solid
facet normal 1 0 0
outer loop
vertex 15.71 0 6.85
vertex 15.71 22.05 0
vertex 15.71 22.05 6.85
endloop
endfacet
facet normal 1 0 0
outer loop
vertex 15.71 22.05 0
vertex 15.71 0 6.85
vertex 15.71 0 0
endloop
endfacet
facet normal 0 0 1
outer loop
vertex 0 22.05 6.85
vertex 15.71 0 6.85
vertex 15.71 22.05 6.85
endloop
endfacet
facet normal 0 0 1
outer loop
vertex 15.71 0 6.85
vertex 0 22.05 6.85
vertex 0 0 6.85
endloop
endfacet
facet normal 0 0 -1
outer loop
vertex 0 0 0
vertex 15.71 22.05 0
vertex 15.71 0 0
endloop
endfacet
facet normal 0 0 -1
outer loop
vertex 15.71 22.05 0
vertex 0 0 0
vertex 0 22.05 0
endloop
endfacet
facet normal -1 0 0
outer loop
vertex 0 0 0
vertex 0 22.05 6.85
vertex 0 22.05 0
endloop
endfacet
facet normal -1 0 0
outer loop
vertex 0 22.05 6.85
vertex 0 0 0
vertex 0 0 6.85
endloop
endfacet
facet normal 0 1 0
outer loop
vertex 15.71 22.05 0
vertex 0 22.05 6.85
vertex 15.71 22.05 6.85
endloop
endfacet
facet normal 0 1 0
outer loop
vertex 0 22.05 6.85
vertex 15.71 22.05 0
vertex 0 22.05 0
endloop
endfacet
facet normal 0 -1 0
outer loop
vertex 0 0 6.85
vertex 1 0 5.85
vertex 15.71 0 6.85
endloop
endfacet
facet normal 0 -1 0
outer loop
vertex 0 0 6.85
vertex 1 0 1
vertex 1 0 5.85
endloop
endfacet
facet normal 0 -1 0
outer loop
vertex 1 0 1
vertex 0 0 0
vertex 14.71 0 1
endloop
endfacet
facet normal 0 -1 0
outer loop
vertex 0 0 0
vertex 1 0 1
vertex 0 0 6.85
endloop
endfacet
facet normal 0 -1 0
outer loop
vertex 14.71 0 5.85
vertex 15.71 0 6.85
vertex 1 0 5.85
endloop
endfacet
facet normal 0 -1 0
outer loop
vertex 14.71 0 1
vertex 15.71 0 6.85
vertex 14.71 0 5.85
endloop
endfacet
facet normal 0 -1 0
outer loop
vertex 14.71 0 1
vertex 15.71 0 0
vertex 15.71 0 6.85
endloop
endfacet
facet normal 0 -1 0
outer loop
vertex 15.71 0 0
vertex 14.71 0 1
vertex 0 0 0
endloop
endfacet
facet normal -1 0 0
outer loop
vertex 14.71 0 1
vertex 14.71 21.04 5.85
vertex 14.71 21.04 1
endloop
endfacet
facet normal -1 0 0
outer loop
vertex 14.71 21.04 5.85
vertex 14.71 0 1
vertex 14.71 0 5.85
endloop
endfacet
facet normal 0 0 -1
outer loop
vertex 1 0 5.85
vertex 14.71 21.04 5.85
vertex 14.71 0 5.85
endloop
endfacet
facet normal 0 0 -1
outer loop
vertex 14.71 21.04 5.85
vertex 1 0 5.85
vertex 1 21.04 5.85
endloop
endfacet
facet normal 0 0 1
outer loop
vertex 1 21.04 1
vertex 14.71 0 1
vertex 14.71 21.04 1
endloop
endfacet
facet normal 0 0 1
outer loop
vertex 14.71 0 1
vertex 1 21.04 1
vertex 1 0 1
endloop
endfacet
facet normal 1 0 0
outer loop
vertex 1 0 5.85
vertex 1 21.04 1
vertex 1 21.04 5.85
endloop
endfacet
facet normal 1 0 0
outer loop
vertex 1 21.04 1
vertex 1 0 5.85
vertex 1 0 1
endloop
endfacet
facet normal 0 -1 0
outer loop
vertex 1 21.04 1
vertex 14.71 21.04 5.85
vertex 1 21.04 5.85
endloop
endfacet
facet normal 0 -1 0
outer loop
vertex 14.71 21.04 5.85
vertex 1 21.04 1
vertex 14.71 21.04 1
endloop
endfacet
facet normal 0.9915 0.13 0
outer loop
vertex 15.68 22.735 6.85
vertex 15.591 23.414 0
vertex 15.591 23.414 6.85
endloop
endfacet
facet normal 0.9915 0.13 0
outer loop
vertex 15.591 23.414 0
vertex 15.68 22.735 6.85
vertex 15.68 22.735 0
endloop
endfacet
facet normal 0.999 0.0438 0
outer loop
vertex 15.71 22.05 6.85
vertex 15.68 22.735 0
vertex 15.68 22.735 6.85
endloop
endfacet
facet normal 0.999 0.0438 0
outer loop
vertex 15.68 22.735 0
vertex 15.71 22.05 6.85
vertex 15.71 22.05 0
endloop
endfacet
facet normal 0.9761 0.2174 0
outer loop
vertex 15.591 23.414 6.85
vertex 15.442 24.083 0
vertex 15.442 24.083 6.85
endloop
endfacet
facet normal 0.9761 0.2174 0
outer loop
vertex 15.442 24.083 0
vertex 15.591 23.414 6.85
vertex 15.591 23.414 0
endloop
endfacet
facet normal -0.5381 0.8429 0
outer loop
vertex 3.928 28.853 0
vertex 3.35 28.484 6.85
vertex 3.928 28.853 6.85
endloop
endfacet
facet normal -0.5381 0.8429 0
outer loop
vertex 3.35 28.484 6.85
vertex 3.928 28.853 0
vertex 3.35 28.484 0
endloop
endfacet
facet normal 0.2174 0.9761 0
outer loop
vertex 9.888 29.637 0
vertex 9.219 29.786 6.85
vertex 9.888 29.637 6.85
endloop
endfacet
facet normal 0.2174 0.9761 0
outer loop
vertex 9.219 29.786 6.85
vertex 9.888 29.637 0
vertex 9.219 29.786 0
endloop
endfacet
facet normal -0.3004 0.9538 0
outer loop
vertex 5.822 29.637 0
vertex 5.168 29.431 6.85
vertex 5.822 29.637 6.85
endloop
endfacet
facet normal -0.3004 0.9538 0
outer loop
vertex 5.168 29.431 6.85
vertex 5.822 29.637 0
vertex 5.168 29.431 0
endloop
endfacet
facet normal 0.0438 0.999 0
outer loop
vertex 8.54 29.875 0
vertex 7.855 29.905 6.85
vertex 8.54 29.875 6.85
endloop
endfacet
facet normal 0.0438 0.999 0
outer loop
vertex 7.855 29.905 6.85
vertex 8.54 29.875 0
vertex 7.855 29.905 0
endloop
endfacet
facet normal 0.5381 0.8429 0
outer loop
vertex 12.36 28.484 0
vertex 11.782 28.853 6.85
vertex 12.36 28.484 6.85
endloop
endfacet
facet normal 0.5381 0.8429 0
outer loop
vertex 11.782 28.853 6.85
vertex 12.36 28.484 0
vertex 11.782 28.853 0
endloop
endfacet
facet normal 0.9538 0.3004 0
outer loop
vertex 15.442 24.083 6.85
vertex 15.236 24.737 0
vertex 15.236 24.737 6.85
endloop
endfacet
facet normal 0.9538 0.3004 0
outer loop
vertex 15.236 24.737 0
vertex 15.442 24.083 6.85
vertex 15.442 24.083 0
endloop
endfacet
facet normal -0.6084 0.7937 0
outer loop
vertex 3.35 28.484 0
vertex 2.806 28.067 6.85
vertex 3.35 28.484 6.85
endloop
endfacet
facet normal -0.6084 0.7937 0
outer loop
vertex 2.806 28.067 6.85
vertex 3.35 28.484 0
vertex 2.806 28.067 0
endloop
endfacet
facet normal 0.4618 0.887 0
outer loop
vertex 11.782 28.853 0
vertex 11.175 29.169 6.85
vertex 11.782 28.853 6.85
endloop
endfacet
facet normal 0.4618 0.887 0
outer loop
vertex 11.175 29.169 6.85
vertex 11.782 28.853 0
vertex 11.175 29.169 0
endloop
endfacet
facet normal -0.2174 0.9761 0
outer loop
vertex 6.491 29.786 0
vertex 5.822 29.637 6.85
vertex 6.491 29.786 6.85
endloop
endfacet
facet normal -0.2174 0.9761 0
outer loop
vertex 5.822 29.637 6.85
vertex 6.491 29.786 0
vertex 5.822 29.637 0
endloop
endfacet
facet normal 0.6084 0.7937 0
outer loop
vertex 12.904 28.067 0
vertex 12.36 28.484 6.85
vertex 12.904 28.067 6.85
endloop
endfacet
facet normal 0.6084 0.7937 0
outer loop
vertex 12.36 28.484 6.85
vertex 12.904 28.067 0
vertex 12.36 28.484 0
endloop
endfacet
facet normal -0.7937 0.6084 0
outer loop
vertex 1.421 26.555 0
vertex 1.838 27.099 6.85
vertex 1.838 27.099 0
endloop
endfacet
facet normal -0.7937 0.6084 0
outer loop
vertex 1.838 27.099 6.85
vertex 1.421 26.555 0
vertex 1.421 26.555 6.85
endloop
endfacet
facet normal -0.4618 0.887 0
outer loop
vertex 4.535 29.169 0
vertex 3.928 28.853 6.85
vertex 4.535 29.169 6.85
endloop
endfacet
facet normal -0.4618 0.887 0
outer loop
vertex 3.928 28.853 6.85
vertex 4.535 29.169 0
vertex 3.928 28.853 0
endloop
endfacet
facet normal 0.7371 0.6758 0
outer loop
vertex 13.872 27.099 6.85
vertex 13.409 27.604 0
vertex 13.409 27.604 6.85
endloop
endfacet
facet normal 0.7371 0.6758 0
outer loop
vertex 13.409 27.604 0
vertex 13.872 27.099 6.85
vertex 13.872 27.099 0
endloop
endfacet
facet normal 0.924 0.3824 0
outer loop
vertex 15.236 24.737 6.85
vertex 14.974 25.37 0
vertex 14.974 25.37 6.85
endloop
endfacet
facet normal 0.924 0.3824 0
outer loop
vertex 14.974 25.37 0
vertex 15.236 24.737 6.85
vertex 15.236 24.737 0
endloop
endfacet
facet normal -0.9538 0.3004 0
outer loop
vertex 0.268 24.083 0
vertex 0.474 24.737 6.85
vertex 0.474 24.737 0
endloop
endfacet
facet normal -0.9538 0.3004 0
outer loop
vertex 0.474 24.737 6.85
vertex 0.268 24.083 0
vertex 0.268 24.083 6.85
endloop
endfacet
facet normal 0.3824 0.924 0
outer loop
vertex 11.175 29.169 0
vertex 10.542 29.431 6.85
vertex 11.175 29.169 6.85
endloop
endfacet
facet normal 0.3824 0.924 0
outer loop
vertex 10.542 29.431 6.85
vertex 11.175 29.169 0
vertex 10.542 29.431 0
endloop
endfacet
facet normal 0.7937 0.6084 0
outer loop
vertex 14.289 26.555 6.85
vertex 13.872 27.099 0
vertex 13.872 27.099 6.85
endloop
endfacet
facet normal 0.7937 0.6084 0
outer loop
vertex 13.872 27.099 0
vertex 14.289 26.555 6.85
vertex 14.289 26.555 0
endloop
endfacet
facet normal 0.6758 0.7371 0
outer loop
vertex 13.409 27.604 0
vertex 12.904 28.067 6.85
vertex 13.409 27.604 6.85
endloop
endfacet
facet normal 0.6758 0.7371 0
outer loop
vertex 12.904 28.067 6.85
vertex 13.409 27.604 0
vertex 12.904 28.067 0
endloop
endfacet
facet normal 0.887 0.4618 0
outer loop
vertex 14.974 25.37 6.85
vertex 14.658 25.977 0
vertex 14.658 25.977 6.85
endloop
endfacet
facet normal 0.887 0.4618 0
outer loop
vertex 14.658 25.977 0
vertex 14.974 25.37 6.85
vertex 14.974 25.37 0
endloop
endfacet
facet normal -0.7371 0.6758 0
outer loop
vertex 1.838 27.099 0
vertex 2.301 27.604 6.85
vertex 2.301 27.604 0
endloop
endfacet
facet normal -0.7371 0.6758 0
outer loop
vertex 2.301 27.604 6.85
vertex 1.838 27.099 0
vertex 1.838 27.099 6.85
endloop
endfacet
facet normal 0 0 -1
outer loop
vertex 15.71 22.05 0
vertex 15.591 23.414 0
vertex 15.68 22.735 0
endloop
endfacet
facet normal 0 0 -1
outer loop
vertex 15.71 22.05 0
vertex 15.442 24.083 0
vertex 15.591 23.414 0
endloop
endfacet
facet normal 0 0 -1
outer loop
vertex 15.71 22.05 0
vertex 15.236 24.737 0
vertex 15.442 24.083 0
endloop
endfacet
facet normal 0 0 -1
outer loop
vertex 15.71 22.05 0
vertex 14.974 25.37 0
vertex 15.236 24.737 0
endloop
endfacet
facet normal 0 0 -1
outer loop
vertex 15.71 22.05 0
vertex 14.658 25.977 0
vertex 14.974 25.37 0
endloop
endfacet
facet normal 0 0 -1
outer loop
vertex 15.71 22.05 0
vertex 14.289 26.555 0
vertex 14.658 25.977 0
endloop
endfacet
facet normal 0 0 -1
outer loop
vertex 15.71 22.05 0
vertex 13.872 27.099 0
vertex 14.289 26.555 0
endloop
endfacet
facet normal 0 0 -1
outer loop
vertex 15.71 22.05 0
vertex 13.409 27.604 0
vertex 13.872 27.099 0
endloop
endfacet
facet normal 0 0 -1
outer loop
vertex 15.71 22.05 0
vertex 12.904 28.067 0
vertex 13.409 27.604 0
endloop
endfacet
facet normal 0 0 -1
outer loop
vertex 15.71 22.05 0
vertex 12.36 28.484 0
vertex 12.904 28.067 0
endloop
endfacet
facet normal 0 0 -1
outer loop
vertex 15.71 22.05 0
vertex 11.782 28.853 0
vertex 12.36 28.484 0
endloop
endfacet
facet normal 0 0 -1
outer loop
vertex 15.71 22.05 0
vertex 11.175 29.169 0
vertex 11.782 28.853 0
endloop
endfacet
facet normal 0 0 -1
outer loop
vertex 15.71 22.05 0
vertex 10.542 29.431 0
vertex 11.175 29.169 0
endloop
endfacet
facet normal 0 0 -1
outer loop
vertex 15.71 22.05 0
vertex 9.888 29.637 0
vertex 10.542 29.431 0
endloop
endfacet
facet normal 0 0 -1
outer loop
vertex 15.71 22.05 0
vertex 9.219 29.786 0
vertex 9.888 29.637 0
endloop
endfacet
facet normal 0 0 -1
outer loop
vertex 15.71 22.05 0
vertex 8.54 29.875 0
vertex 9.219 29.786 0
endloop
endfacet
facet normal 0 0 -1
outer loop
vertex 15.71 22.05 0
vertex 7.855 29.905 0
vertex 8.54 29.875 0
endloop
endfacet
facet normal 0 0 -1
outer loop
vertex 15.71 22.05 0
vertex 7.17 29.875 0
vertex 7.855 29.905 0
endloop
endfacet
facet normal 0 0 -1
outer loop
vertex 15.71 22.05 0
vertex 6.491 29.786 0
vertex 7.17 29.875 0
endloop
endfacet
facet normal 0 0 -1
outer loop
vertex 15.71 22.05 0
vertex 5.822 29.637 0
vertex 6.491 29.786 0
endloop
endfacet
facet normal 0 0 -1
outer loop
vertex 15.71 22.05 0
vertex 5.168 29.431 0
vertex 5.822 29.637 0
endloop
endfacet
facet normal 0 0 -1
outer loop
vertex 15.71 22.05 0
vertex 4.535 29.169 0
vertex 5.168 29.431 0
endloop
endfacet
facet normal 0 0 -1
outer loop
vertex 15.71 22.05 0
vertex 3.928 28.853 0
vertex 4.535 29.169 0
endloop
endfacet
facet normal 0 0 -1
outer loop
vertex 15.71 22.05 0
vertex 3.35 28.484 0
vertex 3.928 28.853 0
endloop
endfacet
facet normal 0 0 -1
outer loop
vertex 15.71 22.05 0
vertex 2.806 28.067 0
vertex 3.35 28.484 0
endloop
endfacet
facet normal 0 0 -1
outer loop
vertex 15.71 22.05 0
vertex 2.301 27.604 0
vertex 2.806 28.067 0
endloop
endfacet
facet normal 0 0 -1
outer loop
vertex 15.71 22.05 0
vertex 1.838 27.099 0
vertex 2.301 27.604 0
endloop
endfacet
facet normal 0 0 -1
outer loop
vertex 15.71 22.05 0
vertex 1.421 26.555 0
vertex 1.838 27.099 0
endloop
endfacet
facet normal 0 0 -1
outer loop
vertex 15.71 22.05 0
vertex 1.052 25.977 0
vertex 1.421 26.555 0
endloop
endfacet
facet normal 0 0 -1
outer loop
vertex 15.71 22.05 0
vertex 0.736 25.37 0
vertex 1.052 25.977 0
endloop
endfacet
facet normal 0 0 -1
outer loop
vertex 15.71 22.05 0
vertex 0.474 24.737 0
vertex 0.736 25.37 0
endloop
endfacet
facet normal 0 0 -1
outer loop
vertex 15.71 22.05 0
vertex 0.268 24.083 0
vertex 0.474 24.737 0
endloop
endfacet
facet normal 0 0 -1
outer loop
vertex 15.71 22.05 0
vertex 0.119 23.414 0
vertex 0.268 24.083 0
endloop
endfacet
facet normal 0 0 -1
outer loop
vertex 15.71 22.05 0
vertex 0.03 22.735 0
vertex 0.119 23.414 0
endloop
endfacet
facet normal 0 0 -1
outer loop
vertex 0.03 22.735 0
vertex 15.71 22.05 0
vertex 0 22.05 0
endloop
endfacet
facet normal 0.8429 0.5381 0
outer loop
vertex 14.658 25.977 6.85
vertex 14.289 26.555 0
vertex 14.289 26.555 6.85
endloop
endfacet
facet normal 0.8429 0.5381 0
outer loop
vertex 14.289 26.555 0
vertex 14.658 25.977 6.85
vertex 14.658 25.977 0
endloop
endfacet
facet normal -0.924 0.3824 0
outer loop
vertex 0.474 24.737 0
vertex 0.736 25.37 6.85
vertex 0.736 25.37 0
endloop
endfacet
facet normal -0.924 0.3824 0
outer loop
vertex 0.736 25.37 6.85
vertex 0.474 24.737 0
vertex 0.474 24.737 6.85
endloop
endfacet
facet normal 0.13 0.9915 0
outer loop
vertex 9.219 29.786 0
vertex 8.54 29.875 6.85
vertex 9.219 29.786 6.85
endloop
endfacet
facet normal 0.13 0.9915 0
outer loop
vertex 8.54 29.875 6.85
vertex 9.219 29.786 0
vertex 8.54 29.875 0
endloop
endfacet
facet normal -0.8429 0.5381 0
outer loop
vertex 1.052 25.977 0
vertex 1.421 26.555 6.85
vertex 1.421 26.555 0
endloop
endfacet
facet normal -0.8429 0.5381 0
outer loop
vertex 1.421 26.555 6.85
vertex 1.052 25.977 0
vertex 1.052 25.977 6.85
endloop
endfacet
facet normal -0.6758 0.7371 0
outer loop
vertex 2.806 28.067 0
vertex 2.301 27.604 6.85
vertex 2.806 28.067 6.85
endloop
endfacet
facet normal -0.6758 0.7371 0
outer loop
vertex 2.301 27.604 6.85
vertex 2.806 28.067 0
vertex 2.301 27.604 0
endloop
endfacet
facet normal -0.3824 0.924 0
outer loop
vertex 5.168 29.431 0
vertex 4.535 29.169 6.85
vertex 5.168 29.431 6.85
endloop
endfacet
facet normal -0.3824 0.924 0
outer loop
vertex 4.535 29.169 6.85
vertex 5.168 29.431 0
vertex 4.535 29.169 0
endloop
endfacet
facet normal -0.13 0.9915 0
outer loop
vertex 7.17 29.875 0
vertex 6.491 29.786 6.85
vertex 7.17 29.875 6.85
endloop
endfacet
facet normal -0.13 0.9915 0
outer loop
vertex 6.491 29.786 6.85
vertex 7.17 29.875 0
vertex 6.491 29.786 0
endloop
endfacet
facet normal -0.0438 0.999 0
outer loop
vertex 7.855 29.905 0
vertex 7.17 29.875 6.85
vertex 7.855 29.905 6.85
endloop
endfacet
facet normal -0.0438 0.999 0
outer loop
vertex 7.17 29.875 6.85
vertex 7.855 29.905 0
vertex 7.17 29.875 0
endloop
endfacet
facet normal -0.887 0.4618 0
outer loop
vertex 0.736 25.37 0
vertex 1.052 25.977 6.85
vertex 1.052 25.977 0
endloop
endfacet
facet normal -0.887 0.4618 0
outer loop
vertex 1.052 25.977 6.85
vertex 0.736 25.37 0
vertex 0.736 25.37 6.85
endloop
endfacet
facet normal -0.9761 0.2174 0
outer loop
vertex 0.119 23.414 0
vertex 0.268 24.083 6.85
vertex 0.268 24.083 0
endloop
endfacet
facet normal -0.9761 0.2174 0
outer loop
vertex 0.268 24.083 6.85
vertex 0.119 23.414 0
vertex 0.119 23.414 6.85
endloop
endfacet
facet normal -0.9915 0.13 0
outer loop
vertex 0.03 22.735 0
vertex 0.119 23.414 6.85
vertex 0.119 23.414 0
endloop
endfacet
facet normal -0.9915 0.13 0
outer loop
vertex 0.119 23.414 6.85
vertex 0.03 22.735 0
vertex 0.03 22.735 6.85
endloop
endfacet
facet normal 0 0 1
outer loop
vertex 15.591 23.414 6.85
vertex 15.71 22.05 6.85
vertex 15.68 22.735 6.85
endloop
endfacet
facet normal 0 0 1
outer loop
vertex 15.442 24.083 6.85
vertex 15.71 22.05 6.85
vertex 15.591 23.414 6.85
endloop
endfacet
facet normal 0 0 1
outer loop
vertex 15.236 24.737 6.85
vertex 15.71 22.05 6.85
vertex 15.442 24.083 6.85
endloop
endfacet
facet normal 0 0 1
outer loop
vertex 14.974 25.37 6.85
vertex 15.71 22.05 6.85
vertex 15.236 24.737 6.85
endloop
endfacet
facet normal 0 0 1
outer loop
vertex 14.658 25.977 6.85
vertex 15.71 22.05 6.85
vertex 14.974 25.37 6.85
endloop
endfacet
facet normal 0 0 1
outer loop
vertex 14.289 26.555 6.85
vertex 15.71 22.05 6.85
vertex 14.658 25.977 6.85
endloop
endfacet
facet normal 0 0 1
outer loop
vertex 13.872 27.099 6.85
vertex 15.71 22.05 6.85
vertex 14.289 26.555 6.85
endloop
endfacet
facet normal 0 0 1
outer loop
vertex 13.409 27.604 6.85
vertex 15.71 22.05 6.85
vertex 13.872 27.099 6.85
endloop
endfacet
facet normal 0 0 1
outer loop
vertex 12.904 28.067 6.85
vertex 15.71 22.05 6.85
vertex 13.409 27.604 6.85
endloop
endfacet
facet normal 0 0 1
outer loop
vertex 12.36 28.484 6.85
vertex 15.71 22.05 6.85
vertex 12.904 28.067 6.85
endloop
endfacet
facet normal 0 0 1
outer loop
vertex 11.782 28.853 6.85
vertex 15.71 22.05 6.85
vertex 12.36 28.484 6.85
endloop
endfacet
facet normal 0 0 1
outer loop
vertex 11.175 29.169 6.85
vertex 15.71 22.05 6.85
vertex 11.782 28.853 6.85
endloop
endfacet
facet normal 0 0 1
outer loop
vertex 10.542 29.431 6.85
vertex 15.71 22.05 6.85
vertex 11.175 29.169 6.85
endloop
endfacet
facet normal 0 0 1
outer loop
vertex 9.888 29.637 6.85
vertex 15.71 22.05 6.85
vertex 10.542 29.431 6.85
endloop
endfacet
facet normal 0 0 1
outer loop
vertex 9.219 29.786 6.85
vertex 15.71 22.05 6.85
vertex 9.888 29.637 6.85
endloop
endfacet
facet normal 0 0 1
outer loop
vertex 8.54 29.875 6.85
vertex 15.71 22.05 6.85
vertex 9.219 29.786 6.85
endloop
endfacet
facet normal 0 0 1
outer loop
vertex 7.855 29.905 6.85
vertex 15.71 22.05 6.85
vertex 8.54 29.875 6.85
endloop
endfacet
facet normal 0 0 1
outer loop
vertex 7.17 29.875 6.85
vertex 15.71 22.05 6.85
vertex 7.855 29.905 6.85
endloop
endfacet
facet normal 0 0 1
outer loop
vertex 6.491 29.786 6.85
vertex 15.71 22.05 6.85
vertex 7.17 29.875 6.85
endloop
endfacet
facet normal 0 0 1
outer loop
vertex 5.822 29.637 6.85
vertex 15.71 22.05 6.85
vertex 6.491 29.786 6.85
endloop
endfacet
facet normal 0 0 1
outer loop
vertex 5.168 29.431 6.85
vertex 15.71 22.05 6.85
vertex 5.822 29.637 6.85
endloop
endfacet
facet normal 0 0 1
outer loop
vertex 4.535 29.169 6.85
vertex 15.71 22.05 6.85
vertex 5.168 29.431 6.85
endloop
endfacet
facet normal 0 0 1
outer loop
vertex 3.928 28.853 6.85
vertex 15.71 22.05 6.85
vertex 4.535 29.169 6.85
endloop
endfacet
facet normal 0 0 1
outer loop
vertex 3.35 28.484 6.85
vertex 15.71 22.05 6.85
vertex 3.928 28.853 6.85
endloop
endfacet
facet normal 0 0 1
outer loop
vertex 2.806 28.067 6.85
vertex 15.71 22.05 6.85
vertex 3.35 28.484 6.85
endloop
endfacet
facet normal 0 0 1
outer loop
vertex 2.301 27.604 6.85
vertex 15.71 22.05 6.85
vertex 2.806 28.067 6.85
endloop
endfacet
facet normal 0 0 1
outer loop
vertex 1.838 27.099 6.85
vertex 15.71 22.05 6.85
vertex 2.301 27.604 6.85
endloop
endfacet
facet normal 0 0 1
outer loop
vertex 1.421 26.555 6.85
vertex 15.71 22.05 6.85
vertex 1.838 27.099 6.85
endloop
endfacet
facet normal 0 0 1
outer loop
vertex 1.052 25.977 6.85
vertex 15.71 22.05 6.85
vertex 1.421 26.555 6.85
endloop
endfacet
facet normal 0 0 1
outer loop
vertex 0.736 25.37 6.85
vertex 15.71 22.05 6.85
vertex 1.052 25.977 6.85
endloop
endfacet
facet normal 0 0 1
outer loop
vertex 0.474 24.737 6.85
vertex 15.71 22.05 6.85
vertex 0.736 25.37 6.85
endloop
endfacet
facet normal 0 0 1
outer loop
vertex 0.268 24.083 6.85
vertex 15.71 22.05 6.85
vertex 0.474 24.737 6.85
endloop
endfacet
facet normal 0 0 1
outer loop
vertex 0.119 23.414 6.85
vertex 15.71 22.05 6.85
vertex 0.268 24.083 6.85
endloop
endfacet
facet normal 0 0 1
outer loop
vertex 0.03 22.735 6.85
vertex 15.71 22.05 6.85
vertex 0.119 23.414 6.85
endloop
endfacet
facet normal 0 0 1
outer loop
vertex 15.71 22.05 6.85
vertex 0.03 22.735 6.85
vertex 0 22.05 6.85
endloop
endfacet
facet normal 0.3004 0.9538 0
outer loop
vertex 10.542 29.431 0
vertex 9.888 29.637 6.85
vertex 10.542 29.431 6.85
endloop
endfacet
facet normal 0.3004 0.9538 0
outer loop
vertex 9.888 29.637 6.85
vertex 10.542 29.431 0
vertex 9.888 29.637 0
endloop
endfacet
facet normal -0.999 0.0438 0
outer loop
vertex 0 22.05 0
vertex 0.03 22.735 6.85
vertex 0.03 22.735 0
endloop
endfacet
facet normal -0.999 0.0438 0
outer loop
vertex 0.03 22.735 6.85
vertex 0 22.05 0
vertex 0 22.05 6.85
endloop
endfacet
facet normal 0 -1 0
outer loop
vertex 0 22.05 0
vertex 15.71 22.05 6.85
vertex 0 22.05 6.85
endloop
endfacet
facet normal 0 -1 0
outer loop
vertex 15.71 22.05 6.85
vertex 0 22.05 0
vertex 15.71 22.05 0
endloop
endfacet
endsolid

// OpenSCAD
// value to help openSCAD with overlaps
_DELTA = 0.01;
// value to add to measured dimensions for final print accuracy
_EXP_VAL = 0.2;

USB_HEIGHT =  4.65 + _EXP_VAL;
USB_WIDTH  = 13.51 + _EXP_VAL;
USB_DEPTH  = 20.85 + _EXP_VAL;
WALL_THICKNESS = 1;

module body() {
    difference() {
        cube([USB_WIDTH+2*WALL_THICKNESS, USB_DEPTH+WALL_THICKNESS, USB_HEIGHT+2*WALL_THICKNESS]);
        translate([WALL_THICKNESS, -_DELTA, WALL_THICKNESS])
            cube([USB_WIDTH, USB_DEPTH, USB_HEIGHT]);
    }
}


module end_cap() {
    $fn = 72;
    cyl_diameter = USB_WIDTH+2*WALL_THICKNESS;
    cyl_height = USB_HEIGHT+2*WALL_THICKNESS;
    cyl_trans_x = cyl_diameter/2;
    cyl_trans_y = USB_DEPTH+WALL_THICKNESS;
    translate([cyl_trans_x, cyl_trans_y, 0])
    difference() {
        cylinder(cyl_height, cyl_diameter/2, cyl_diameter/2);
        translate([0, -cyl_diameter/4, cyl_height/2-_DELTA])
            cube([cyl_diameter, cyl_diameter/2, cyl_height+3*_DELTA], center=true);
    }
}

body();
end_cap();
